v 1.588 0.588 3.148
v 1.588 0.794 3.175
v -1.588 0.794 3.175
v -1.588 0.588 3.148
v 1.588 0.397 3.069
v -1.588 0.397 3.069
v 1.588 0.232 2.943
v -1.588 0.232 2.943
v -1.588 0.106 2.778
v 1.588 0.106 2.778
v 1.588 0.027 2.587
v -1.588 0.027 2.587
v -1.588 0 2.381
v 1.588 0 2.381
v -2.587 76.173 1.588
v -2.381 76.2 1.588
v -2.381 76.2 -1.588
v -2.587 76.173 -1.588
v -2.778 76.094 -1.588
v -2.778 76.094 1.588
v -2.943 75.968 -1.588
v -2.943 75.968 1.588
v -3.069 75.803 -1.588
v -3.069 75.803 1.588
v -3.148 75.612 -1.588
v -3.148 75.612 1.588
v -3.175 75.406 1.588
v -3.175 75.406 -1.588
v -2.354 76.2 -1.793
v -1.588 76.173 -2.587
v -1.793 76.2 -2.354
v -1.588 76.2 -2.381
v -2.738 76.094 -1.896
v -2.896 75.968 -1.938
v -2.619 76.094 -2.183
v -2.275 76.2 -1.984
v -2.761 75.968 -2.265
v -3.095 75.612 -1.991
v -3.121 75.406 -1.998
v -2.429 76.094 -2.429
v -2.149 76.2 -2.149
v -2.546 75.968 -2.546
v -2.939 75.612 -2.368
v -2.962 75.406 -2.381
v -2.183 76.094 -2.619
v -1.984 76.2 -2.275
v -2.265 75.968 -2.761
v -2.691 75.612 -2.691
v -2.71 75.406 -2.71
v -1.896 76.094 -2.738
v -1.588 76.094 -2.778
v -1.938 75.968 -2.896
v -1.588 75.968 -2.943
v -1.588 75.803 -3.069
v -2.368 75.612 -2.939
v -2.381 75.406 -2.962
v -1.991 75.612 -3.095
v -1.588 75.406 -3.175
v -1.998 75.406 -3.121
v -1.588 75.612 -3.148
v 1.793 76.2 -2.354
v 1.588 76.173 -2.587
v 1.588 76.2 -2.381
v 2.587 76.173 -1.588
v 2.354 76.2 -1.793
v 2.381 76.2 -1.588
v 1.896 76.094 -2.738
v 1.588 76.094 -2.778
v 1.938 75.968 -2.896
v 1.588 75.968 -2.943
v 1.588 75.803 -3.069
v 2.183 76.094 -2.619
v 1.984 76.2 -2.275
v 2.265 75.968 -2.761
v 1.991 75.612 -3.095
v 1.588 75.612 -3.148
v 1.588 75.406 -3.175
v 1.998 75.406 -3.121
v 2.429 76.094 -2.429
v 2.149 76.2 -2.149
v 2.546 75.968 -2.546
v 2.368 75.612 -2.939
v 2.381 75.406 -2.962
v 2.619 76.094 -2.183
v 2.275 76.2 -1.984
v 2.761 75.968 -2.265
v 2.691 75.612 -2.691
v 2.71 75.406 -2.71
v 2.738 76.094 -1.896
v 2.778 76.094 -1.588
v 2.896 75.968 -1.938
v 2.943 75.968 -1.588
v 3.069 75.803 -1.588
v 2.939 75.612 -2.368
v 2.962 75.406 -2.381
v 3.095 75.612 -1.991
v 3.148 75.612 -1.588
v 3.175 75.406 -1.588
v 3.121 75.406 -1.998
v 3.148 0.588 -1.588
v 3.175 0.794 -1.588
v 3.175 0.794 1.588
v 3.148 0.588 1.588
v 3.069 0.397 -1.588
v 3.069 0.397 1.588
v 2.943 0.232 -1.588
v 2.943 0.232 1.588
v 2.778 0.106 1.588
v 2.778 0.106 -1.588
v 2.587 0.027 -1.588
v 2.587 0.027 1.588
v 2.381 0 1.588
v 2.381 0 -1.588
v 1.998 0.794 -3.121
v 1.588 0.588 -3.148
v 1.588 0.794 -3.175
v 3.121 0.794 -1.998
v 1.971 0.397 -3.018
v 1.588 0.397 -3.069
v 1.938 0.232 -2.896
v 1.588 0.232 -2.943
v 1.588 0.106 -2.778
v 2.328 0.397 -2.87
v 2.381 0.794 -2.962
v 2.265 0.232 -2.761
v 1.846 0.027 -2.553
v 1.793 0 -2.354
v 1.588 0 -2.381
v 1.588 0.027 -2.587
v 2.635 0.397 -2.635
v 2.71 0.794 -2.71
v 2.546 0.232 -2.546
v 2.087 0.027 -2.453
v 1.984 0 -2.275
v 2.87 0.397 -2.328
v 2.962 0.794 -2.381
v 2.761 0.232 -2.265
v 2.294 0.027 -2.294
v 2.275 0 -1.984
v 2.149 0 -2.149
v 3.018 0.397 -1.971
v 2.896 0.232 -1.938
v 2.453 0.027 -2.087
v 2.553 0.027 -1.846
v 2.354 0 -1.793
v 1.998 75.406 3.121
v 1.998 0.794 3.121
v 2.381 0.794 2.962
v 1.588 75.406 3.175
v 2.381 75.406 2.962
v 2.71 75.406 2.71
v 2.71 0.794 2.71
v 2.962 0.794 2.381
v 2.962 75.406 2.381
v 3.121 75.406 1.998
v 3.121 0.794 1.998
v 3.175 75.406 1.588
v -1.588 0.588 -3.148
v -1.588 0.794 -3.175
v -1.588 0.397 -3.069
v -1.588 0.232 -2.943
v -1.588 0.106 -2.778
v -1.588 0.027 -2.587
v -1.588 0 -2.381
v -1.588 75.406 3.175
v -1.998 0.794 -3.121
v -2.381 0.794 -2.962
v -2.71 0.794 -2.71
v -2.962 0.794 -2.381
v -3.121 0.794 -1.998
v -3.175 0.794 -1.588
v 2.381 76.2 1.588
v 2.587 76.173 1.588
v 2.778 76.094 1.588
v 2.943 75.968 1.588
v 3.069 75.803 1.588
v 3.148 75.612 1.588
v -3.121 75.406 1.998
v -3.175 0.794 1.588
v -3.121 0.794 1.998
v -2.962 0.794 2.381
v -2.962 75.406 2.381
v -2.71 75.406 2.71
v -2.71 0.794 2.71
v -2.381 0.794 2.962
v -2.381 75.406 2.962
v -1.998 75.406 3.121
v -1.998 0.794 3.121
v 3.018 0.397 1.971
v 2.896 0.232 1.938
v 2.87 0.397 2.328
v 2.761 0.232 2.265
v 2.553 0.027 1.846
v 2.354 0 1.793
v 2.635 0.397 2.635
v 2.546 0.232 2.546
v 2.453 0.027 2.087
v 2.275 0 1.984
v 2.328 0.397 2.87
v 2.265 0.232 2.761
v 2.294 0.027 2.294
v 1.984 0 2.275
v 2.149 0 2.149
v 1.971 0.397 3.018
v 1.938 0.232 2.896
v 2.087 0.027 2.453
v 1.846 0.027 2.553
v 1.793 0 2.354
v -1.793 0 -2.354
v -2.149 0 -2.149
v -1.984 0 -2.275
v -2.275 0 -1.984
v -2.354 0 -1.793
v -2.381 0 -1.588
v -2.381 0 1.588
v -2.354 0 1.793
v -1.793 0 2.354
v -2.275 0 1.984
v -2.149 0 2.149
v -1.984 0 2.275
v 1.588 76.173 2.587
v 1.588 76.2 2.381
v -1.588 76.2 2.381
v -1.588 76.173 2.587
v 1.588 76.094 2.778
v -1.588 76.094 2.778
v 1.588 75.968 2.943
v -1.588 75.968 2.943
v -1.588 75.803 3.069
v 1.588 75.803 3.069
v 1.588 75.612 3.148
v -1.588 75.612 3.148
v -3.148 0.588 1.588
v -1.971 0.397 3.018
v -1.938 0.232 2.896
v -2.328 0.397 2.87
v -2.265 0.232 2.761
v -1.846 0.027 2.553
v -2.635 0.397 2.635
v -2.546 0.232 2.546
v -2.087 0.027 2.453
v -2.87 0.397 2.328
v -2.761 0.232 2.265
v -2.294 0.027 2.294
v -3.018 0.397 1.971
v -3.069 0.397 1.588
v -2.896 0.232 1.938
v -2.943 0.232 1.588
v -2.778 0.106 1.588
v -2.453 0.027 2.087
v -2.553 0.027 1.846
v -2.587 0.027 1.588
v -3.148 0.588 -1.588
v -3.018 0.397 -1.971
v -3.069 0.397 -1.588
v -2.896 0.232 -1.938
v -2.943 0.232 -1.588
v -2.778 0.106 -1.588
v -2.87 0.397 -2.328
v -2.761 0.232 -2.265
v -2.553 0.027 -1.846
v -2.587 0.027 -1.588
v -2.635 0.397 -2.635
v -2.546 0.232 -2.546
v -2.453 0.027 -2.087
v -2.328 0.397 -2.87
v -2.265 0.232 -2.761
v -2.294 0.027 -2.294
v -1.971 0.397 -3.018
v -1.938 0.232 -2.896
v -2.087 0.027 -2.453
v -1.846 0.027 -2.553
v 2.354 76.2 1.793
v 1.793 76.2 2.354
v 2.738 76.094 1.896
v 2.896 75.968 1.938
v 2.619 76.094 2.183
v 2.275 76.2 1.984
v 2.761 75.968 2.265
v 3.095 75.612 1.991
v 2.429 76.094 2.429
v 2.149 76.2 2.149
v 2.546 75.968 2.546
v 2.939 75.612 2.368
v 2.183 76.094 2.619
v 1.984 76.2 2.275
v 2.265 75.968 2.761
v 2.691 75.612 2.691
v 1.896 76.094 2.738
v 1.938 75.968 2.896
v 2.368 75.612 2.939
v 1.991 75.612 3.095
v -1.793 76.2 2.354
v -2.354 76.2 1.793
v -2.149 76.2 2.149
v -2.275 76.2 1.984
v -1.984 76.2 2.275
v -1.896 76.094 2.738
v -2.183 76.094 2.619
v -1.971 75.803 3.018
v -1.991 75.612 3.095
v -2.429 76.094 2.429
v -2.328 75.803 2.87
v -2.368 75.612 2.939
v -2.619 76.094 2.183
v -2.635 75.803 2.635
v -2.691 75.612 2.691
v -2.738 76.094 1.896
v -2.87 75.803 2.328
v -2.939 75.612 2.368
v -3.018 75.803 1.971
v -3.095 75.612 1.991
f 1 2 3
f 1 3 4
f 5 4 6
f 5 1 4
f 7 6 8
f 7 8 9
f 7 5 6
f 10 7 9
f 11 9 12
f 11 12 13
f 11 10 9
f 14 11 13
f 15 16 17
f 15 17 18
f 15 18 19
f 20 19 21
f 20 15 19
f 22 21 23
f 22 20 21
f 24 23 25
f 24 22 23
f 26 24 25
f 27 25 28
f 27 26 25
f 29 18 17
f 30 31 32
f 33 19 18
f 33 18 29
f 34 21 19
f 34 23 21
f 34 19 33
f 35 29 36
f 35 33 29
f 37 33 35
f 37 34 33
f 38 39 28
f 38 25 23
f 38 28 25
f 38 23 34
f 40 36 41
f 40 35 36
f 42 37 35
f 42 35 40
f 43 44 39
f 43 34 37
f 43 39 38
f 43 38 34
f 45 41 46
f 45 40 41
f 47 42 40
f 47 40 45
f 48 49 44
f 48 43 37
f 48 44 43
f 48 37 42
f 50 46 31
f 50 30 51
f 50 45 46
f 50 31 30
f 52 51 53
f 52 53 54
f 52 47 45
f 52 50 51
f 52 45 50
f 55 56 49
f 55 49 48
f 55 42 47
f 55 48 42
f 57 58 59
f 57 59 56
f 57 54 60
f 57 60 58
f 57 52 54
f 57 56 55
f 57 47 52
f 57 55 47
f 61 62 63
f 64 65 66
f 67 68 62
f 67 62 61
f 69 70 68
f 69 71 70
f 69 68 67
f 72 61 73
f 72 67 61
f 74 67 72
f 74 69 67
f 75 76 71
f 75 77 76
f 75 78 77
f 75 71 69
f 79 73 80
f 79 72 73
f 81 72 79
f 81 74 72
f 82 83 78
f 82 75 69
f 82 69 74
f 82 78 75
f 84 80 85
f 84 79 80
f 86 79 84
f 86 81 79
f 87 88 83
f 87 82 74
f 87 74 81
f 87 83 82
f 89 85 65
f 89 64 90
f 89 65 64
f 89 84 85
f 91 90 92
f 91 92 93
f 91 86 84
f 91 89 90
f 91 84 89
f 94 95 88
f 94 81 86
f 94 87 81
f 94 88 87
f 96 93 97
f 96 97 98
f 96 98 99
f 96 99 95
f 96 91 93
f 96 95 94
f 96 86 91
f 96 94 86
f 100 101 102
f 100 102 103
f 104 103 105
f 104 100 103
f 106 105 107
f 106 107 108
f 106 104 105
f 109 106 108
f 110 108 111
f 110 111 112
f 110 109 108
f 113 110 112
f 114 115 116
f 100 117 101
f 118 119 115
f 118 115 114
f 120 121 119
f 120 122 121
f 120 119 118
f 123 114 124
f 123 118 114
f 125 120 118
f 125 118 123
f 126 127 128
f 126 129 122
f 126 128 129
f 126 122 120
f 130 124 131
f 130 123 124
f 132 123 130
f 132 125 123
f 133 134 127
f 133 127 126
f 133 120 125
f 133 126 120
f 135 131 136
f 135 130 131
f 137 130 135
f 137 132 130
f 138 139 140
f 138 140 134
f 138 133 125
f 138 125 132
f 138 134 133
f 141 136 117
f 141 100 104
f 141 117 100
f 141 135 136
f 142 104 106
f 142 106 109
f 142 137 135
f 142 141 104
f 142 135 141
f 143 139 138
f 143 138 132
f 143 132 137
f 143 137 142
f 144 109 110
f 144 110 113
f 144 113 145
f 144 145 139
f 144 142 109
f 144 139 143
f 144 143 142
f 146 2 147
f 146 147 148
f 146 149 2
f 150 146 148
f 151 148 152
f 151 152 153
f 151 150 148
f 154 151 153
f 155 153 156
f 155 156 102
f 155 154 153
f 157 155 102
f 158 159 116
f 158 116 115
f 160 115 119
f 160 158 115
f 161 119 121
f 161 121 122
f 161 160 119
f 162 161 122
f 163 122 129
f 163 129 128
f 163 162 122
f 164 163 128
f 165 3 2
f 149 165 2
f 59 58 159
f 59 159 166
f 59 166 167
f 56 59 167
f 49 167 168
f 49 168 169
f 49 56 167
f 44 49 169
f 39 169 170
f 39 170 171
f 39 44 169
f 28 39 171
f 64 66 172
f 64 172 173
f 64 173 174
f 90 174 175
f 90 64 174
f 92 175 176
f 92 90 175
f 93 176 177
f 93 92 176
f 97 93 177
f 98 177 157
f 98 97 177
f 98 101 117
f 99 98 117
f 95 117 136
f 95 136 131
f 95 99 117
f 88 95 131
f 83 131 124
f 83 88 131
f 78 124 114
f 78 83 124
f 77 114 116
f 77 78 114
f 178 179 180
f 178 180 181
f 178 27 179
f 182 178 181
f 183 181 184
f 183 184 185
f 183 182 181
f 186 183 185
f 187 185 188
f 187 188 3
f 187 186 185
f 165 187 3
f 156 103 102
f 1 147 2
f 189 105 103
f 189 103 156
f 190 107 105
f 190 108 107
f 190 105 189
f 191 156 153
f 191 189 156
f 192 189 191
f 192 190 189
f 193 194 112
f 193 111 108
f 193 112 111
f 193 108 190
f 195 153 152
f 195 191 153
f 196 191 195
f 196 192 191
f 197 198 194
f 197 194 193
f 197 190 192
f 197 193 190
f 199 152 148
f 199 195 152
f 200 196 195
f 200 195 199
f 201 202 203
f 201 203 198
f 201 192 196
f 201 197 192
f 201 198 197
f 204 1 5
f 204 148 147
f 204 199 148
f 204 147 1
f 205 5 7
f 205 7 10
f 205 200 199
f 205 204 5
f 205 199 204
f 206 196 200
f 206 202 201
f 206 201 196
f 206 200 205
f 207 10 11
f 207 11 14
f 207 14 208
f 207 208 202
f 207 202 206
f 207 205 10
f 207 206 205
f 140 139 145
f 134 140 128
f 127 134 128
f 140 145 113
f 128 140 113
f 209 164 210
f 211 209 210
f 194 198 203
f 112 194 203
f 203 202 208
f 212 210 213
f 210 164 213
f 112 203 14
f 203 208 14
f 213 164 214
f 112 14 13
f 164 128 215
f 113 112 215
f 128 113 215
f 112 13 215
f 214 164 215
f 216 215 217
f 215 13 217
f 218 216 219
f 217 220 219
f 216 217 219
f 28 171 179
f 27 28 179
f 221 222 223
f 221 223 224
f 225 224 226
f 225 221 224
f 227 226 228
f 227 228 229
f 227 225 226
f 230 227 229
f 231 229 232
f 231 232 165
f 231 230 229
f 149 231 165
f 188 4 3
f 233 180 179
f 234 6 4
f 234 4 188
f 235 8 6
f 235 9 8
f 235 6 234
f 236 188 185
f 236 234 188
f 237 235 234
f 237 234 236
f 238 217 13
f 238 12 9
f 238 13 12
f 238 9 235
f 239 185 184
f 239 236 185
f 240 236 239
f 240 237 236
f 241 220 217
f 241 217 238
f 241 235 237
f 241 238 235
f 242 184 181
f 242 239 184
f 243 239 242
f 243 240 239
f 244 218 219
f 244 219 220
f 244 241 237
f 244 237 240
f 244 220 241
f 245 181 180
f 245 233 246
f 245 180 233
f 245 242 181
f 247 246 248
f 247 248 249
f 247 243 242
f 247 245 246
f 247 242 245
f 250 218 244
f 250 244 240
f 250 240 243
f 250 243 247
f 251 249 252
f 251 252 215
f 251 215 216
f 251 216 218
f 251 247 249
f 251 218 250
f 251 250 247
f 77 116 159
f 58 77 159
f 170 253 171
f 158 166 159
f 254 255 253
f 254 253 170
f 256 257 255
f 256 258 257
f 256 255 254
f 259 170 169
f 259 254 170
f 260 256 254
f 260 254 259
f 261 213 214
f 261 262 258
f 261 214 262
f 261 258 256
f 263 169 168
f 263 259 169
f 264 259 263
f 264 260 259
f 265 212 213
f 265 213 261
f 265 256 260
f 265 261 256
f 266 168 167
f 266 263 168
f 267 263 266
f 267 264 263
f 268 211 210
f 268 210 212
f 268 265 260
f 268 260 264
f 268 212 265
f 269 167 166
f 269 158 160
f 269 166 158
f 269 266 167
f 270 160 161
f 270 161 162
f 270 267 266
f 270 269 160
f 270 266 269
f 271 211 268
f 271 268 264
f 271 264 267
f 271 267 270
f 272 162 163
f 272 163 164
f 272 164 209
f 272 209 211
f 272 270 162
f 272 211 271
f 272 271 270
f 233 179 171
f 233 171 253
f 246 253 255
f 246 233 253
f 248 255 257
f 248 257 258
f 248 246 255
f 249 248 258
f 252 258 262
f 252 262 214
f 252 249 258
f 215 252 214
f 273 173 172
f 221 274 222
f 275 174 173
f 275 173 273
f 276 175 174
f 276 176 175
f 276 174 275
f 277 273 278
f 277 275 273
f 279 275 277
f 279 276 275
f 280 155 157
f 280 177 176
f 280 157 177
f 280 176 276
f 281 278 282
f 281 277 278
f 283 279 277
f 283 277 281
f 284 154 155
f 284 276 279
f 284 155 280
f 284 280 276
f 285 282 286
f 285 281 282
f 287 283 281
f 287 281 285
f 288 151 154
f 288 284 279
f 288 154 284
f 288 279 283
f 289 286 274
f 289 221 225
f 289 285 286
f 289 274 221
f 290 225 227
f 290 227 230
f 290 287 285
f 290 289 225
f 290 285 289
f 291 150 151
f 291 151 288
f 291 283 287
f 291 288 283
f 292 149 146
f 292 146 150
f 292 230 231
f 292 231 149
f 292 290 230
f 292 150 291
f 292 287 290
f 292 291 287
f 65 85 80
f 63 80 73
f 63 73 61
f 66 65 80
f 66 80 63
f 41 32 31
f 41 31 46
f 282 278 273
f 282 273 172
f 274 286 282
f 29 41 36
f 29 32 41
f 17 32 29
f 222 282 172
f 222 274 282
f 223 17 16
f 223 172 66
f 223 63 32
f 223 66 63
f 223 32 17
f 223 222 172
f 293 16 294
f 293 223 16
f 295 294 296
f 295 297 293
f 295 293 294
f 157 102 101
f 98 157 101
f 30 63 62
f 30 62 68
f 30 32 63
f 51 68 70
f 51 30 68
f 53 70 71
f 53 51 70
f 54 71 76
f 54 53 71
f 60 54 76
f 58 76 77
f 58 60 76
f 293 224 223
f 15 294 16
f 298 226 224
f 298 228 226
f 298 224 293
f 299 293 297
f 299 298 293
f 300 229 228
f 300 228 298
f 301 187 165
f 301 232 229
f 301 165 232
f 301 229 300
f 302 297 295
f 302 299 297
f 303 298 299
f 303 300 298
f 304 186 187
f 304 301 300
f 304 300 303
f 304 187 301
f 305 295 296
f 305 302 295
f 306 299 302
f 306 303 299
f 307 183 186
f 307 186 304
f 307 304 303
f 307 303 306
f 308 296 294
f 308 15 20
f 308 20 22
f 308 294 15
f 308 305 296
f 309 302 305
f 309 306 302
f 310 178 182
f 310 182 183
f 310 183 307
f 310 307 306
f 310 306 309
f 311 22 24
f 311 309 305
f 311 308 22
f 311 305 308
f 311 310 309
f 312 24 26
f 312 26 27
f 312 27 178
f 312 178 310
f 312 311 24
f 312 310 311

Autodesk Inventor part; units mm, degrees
ref_plane "YZ Plane" through (0, 0, 0) normal (1, 0, 0) x (0, 1, 0)
ref_plane "XZ Plane" through (0, 0, 0) normal (0, 1, 0) x (-1, 0, 0)
ref_plane "XY Plane" through (0, 0, 0) normal (0, 0, 1) x (1, 0, 0)
sketch "Sketch1" plane through (0, 0, 0) normal (0, 1, 0) x (-1, 0, 0)
  line L0 (-3.175, -3.175) -> (3.175, -3.175)
  line L1 (3.175, -3.175) -> (3.175, 3.175)
  line L2 (3.175, 3.175) -> (-3.175, 3.175)
  line L3 (-3.175, 3.175) -> (-3.175, -3.175)
  line L4 (-3.175, -3.175) -> (3.175, 3.175) construction
  line L5 (3.175, -3.175) -> (-3.175, 3.175) construction
  point P0 (0, 0)
  dimension "d0" = 6.35
  dimension "d1" = 6.35
extrude "Extrusion1" add sketch "Sketch1" along normal blind 76.2
fillet "Fillet1" radius 1.5875 4 edges at (3.175, 38.1, -3.175) (-3.175, 38.1, -3.175) (3.175, 38.1, 3.175) (-3.175, 38.1, 3.175)
fillet "Fillet2" radius 0.7937 16 edges at (3.175, 0, 0) (2.71, 0, -2.71) (0, 0, -3.175) (-2.71, 0, -2.71) (-3.175, 0, 0) (-2.71, 0, 2.71) (0, 0, 3.175) (2.71, 0, 2.71) (0, 76.2, 3.175) (-2.71, 76.2, 2.71) (-3.175, 76.2, 0) (-2.71, 76.2, -2.71) (0, 76.2, -3.175) (2.71, 76.2, -2.71) (3.175, 76.2, 0) (2.71, 76.2, 2.71)
properties part number "3inch" material "Stainless Steel"
